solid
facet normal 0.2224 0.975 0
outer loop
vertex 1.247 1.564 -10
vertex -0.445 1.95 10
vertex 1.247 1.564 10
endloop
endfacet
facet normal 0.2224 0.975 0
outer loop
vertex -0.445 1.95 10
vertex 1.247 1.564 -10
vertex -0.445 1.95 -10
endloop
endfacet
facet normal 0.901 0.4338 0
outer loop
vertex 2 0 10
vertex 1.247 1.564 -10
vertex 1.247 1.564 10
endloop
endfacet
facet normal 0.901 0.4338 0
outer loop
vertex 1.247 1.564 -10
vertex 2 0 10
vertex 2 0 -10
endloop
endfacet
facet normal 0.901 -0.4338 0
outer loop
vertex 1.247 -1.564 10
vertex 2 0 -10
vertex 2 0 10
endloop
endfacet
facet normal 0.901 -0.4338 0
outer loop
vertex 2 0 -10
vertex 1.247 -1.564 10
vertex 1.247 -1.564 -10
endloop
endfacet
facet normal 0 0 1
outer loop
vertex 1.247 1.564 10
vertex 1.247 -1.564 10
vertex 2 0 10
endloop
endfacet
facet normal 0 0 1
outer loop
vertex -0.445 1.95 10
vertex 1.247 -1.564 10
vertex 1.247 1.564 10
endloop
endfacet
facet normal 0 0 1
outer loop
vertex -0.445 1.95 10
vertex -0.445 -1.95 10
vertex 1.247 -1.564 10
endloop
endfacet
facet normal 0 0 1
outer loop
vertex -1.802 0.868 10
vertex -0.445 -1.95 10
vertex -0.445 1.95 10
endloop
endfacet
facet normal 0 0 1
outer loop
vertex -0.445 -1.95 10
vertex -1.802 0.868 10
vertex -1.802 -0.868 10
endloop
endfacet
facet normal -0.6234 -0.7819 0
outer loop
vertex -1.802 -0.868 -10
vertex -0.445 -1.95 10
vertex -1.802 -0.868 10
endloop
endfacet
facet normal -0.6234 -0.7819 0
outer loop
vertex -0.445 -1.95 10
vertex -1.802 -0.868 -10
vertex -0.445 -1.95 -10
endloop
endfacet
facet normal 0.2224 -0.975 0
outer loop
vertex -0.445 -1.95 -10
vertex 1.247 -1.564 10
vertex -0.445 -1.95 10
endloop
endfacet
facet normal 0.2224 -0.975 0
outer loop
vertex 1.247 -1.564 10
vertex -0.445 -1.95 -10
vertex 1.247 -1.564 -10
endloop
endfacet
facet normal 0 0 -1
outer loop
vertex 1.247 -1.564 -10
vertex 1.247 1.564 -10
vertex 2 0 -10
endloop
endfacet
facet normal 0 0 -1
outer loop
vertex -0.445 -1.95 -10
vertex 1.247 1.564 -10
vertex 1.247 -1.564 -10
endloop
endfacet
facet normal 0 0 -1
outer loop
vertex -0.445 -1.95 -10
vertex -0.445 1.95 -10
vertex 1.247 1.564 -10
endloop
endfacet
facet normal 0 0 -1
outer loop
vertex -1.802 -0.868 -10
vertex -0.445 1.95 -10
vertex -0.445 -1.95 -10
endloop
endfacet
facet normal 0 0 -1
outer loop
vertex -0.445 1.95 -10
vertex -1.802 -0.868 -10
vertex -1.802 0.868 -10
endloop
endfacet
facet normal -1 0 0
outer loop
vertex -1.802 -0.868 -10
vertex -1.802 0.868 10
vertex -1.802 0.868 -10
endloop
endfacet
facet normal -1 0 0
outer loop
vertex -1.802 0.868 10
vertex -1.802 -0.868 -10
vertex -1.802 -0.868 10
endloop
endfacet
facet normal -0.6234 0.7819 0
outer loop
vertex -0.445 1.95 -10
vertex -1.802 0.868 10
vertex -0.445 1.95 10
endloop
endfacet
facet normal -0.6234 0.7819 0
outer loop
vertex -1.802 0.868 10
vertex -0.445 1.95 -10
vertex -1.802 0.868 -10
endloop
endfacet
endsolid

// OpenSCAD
// Generated by generate_scads.py
intersection() {
  cylinder(h=20, r=2, center=true);
  cube(size=[30,30,30], center=true);
  scale([1.0,0.5,1.5]) {
    sphere(r=12);
  }
}
